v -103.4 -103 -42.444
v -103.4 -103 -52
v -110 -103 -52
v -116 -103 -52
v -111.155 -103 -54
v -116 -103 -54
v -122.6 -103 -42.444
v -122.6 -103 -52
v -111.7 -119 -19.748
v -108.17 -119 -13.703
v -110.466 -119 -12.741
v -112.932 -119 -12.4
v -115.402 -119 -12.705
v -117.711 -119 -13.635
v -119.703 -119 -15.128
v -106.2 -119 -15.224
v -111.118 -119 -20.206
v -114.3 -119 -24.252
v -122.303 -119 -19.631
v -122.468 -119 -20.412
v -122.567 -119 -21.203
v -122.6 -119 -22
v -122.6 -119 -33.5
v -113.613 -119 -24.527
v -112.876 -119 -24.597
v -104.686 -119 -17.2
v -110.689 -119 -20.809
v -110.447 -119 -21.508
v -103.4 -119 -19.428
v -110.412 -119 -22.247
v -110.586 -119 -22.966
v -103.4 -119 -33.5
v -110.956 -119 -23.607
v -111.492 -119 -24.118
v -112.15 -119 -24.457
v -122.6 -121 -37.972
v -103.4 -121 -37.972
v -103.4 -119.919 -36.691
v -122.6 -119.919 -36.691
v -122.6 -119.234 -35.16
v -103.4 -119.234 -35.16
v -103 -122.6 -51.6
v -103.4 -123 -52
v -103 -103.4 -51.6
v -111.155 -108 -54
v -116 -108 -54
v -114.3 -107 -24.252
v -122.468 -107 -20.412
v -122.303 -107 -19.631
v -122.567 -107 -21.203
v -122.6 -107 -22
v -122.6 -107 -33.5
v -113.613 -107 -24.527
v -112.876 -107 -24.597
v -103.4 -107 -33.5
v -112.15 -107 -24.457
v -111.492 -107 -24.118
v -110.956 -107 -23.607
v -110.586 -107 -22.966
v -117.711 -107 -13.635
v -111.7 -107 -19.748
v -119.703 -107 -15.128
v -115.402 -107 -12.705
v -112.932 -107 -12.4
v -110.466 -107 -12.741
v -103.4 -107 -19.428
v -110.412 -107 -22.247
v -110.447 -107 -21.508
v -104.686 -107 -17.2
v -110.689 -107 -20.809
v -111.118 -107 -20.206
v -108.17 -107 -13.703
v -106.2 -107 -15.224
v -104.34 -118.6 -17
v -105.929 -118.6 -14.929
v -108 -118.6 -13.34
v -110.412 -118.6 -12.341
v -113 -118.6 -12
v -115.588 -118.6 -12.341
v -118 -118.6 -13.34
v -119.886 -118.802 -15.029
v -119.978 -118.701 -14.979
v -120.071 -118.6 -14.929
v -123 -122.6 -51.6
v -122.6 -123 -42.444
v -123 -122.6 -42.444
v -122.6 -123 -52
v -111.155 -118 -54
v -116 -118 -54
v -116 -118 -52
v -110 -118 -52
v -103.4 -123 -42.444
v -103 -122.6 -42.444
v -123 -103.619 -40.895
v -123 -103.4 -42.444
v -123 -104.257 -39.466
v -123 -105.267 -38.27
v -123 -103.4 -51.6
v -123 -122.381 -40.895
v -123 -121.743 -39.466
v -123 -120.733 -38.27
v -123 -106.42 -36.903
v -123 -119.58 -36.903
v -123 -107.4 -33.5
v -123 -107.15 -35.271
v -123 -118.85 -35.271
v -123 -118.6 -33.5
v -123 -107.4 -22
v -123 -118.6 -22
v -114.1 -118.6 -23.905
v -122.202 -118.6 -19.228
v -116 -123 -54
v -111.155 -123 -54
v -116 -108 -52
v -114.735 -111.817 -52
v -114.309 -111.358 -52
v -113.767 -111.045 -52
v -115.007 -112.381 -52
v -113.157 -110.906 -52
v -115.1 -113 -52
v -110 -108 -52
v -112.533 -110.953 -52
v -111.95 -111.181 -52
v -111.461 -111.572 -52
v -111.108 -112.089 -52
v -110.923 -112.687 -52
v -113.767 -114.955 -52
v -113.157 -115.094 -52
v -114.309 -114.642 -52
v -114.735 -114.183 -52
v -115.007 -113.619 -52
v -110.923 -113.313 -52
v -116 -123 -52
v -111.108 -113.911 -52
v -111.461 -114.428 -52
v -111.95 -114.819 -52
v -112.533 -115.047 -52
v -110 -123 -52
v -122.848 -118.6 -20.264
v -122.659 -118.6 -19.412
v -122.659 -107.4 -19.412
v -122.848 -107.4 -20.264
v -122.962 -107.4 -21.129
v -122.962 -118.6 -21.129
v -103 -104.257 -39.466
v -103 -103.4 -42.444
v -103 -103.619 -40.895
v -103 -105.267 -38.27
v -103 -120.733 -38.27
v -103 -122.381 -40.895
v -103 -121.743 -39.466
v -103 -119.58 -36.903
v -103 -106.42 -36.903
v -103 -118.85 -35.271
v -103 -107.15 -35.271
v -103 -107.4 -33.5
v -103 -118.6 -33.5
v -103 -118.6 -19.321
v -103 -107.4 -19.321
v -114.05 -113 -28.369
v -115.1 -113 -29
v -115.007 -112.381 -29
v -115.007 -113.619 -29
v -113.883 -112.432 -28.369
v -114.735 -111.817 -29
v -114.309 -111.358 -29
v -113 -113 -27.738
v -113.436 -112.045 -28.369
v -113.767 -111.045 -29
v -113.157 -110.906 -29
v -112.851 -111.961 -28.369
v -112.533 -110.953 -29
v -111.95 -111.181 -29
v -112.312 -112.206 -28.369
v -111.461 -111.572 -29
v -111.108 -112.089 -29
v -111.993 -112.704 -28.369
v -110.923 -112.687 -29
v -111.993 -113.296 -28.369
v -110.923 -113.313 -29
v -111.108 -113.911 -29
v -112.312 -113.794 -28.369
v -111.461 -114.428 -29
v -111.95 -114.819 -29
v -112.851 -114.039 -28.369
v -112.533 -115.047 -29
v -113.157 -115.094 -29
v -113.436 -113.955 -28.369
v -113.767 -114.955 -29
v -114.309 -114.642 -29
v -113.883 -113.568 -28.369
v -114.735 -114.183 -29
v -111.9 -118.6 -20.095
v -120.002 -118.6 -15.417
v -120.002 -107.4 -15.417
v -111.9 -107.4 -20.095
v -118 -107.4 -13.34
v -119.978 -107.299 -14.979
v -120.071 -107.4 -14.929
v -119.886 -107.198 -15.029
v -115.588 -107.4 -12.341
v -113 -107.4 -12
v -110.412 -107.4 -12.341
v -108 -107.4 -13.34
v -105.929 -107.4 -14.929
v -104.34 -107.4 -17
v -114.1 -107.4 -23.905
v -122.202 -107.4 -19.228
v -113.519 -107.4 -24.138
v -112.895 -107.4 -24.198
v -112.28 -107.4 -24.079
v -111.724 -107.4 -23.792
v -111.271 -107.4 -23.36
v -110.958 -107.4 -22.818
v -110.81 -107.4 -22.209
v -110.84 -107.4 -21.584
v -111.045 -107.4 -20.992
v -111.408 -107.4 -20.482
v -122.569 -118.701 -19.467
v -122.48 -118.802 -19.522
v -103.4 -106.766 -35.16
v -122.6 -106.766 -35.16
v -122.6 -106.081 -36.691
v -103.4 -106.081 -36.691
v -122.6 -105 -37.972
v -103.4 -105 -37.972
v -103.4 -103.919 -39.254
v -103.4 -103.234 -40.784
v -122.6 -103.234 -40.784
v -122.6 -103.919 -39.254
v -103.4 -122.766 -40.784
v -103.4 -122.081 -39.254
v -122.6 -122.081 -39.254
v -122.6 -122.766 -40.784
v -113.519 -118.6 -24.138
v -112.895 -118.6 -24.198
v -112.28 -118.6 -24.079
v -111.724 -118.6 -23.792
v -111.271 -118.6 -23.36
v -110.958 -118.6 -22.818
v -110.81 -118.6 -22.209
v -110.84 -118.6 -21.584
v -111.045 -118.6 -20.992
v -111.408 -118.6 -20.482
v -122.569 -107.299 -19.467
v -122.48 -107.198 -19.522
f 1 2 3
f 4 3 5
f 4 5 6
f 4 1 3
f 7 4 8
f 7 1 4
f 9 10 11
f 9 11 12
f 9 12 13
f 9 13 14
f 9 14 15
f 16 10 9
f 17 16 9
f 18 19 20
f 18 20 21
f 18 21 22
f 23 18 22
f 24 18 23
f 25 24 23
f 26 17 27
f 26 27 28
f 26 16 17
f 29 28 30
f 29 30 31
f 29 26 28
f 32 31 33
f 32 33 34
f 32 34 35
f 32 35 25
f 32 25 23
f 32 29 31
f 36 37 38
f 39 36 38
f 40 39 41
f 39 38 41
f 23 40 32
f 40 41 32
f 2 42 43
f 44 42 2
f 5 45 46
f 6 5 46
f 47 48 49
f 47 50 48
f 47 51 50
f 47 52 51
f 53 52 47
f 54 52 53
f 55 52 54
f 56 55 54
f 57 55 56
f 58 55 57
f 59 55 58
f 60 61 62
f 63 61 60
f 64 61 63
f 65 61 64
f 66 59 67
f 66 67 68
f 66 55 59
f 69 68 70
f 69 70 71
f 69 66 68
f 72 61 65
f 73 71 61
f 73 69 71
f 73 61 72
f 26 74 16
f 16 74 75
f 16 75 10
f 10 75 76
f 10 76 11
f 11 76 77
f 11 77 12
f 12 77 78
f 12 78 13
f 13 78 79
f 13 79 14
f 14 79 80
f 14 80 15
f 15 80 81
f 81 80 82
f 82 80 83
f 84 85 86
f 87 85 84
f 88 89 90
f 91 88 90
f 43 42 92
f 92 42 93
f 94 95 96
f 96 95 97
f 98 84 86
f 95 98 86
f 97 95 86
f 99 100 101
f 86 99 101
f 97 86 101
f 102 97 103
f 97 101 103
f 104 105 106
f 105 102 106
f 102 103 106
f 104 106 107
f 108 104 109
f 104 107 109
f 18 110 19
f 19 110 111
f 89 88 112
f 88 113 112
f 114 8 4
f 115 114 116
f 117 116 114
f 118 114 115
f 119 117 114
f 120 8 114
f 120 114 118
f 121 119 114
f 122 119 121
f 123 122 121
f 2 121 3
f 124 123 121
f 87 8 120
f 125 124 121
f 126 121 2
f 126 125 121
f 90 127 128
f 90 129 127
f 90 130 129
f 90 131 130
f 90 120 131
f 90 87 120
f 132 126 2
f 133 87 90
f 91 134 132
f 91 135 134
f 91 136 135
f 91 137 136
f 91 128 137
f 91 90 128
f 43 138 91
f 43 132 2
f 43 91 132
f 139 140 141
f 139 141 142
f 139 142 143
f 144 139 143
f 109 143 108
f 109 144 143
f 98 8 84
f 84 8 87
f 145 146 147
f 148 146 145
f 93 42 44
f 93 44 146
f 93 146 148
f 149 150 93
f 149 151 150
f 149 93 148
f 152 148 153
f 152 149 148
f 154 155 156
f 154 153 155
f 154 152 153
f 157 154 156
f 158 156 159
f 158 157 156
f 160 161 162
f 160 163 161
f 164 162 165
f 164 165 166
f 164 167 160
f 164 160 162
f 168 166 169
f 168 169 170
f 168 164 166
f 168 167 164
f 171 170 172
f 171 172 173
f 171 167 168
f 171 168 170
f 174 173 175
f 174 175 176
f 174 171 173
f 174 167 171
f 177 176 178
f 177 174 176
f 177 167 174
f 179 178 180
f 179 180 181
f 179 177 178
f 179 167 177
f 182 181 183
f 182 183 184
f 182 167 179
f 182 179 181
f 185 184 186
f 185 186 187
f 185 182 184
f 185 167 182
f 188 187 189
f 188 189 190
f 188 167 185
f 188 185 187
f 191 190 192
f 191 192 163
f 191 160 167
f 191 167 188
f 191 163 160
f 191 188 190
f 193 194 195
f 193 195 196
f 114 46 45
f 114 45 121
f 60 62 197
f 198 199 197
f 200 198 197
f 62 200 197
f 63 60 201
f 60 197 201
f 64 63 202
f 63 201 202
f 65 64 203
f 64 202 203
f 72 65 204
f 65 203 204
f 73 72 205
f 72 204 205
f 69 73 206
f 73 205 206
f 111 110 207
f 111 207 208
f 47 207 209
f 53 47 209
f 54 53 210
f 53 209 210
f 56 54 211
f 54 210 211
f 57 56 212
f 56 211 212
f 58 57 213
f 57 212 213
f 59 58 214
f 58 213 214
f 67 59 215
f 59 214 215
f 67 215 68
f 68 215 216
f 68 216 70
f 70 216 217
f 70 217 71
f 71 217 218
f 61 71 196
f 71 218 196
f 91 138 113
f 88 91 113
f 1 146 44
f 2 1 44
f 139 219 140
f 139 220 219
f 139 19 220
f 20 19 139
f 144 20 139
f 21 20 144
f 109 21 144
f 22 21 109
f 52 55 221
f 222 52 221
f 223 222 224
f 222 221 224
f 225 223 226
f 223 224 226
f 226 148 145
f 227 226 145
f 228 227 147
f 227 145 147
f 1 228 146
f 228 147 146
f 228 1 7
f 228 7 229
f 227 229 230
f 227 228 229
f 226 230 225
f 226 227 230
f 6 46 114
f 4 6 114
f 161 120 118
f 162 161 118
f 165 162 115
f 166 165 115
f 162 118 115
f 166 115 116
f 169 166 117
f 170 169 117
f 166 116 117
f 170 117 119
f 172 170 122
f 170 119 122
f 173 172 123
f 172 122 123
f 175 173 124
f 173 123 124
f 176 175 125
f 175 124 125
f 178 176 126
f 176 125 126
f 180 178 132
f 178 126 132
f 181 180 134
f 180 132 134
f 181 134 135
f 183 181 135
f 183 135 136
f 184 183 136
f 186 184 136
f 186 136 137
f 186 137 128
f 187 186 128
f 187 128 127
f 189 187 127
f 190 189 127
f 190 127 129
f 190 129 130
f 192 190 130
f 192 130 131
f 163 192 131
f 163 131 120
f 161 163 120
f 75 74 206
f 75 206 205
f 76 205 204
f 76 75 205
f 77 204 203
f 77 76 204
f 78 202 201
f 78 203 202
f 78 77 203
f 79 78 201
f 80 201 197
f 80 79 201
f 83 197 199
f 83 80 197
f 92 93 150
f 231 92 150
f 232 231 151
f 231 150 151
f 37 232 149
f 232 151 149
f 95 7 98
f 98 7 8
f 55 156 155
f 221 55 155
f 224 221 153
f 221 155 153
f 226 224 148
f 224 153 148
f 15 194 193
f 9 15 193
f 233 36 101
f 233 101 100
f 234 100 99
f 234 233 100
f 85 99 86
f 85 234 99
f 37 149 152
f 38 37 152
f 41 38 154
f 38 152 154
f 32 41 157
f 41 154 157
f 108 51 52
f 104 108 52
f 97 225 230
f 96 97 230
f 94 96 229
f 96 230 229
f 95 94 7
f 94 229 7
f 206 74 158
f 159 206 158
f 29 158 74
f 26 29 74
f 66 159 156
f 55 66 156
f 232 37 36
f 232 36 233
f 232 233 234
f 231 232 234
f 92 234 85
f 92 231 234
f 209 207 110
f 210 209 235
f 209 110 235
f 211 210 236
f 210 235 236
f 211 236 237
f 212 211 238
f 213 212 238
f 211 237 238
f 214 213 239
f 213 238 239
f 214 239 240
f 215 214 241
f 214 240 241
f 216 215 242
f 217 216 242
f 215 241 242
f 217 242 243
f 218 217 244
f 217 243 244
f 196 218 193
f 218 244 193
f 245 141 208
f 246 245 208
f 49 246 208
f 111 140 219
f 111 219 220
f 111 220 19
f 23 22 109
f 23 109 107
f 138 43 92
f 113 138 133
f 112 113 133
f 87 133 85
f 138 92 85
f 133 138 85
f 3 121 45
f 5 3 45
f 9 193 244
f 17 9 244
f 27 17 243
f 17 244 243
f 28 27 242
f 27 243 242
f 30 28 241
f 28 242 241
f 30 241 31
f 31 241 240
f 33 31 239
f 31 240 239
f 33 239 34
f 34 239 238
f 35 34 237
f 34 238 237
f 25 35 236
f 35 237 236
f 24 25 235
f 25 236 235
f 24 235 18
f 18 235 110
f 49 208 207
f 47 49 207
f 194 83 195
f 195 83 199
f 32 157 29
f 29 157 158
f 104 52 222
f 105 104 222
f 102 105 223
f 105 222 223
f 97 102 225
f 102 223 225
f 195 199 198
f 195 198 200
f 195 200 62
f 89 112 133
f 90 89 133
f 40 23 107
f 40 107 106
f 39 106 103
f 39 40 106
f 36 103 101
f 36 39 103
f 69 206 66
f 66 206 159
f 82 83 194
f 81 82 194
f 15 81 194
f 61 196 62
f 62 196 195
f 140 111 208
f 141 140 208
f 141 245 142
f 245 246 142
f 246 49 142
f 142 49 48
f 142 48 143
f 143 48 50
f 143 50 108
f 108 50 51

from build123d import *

# Parameters (mm, degrees)
PAD059_DEPTH         = 10
POCKET157_DEPTH      = 10.001
POCKET157_DEPTH_BACK = 10.001
SKETCH188_R          = 2.1
HOLE055_DEPTH        = 25
HOLE055_TIPS_R       = 2.1
SKETCH_W             = 10
SKETCH_H             = 5
POCKET_DEPTH         = 3
CHAMFER001_SIZE      = 0.4


with BuildPart() as part:
    # Sketch189 → Pad059 (new body, symmetric)
    with BuildSketch(Plane.XZ):
        with BuildLine():
            Line((-10, 0), (-10, 30))
            ThreePointArc((-9.548077, 32.972243), (-9.886374, 31.503202), (-10, 30))
            Line((-1.1, 28.094744), (-9.548077, 32.972243))
            ThreePointArc((-1.1, 28.094744), (1.905256, 28.9), (1.1, 31.905256))
            Line((-7.348077, 36.782755), (1.1, 31.905256))
            ThreePointArc((8.660254, 35), (1.1068, 39.938561), (-7.348077, 36.782755))
            Line((8.660254, 35), (10, 32.679492))
            Line((10, 0), (10, 32.679492))
            Line((10, 0), (3, 0))
            Line((3, 0), (1.845299, -2))
            Line((1.845299, -2), (-3, -2))
            Line((-3, -2), (-3, 0))
            Line((-10, 0), (-3, 0))
        make_face()
    extrude(amount=PAD059_DEPTH, both=True)

    # Sketch190 → Pocket157 (cut, two sides)
    with BuildSketch(Plane.YZ) as pocket157_sk:
        with BuildLine():
            Line((6, 18.5), (6, 40))
            Line((6, 40), (-6, 40))
            Line((-6, 40), (-6, 18.5))
            ThreePointArc((-8, 14.027864), (-6.522774, 16.05051), (-6, 18.5))
            ThreePointArc((-8, 14.027864), (-9.477226, 12.005218), (-10, 9.555728))
            Line((-10, 9.555728), (-10, 3))
            Line((-10, 3), (-11, 3))
            Line((-11, 3), (-11, 41))
            Line((-11, 41), (11, 41))
            Line((11, 3), (11, 41))
            Line((10, 3), (11, 3))
            Line((10, 9.555728), (10, 3))
            ThreePointArc((10, 9.555728), (9.477226, 12.005218), (8, 14.027864))
            ThreePointArc((6, 18.5), (6.522774, 16.05051), (8, 14.027864))
        make_face()
    extrude(amount=-POCKET157_DEPTH, mode=Mode.SUBTRACT)
    extrude(pocket157_sk.sketch, amount=POCKET157_DEPTH_BACK, mode=Mode.SUBTRACT)

    # Sketch188 → Hole055 (cut)
    with BuildSketch(Plane(origin=(0, 0, -2), x_dir=(-1, 0, 0), z_dir=(0, 0, -1))):
        Circle(SKETCH188_R)
    extrude(amount=-HOLE055_DEPTH, mode=Mode.SUBTRACT)

    # Hole055 tips → Hole055 tip 1 section 0
    with BuildSketch(Plane(origin=(0, 0, 23), x_dir=(-1, 0, 0), z_dir=(0, 0, -1)), mode=Mode.PRIVATE) as hole055_tip_1_s0:
        Circle(HOLE055_TIPS_R)
    loft([hole055_tip_1_s0.sketch, Vertex(0, 0, 24.261807)], mode=Mode.SUBTRACT)

    # Sketch → Pocket (cut, symmetric)
    with BuildSketch(Plane.YZ):
        with Locations((0, -2.5)):
            Rectangle(SKETCH_W, SKETCH_H)
    extrude(amount=POCKET_DEPTH, both=True, mode=Mode.SUBTRACT)

    # Chamfer001
    chamfer001_edges = [part.edges().sort_by_distance(p)[0] for p in [
        (10, 6, 25.589746),
        (10, 6.522774, 16.05051),
        (10, 9.477226, 12.005218),
        (10, 10, 6.277864),
        (10, 10, 1.5),
        (10, 0, 0),
        (10, -10, 6.277864),
        (10, -9.477226, 12.005218),
        (10, -10, 1.5),
        (10, -6.522774, 16.05051),
        (10, -6, 25.589746),
        (-10, 0, 0),
        (-10, 10, 1.5),
        (-10, 10, 6.277864),
        (-10, 9.477226, 12.005218),
        (-10, 6.522774, 16.05051),
        (-10, 6, 24.25),
        (-9.886374, 6, 31.503202),
        (-9.886374, -6, 31.503202),
        (-10, -6, 24.25),
        (-10, -6.522774, 16.05051),
        (-10, -9.477226, 12.005218),
        (-10, -10, 6.277864),
        (-10, -10, 1.5),
        (5, 6, 38.660254),
        (9.330127, 6, 33.839746),
        (-4.010763, 6, 39.160446),
        (-4.010763, -6, 39.160446),
        (5, -6, 38.660254),
        (9.330127, -6, 33.839746),
        (-7.348077, 0, 36.782755),
        (-9.548077, 0, 32.972243),
        (-3.124038, 6, 34.344006),
        (1.905256, 6, 28.9),
        (-5.324038, 6, 30.533494),
        (-3.124038, -6, 34.344006),
        (1.905256, -6, 28.9),
        (-5.324038, -6, 30.533494),
    ]]
    chamfer(chamfer001_edges, length=CHAMFER001_SIZE)


with BuildPart() as part_1:
    # Body022039 placement: moved
    add(part.part.moved(Location((-113, -113, -52))))


solid = part_1.part
